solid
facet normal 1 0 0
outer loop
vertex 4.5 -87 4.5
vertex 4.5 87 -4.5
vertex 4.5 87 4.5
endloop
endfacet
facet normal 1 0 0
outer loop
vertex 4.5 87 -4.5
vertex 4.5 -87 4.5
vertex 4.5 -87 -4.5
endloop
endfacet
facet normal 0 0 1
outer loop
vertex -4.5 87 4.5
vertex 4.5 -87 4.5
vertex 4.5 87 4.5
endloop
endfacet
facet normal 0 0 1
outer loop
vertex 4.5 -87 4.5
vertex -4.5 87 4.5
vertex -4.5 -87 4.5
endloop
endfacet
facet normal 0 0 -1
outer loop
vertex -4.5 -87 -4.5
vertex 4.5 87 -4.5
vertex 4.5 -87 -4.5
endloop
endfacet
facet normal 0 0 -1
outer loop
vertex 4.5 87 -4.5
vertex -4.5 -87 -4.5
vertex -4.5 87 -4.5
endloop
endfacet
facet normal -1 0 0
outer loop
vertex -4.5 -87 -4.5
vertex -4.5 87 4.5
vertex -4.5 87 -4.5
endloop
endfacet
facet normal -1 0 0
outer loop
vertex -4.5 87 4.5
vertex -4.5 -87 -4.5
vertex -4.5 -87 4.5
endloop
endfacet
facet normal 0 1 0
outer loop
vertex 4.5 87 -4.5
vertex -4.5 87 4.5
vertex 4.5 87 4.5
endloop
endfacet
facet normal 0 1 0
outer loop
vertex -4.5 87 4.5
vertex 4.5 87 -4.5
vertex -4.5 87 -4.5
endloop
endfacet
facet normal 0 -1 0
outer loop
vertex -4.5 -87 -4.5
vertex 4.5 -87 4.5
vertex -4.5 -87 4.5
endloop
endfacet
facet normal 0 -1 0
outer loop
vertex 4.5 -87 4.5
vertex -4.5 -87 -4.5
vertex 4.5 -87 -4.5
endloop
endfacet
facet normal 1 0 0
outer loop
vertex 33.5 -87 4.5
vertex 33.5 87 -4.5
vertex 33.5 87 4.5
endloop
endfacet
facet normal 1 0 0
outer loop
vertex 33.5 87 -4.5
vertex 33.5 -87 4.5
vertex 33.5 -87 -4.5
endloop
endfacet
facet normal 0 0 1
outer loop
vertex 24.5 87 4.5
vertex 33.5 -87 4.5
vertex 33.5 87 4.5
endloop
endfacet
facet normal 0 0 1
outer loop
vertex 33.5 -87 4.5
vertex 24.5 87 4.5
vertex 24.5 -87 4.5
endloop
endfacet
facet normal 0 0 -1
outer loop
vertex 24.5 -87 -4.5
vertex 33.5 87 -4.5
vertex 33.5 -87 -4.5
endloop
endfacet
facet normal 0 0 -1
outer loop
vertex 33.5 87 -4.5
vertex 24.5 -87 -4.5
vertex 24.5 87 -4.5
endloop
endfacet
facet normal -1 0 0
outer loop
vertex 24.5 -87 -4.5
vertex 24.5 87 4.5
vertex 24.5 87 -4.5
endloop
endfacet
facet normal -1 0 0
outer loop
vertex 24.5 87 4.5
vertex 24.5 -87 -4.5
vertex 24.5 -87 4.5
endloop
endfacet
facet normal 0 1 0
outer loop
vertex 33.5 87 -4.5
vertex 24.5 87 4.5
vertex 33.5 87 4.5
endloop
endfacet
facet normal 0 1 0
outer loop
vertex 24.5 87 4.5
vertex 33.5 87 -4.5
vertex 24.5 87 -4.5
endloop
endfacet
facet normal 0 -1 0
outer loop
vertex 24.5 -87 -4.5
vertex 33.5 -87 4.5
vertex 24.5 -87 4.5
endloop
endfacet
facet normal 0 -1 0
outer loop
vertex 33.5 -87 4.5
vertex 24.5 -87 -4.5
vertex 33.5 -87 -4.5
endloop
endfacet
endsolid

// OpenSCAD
$fn=50; // Sets the number of fragments for rounded shapes. Increase for better resolution.
BOX_W = 9.0; // Box Width
BOX_L = 174;// Box Length
BOX_H = 9.0; // Box Height

module rectangle(width, height, length) {
    cube([width, length, height], center=true);
}

// Call the module to create four rectangular objects, each 10mm apart.
for (i=[0:1]) {
    translate([i*(BOX_W+20), 0, 0]) {
        rectangle(BOX_W, BOX_H, BOX_L);
    }
}
